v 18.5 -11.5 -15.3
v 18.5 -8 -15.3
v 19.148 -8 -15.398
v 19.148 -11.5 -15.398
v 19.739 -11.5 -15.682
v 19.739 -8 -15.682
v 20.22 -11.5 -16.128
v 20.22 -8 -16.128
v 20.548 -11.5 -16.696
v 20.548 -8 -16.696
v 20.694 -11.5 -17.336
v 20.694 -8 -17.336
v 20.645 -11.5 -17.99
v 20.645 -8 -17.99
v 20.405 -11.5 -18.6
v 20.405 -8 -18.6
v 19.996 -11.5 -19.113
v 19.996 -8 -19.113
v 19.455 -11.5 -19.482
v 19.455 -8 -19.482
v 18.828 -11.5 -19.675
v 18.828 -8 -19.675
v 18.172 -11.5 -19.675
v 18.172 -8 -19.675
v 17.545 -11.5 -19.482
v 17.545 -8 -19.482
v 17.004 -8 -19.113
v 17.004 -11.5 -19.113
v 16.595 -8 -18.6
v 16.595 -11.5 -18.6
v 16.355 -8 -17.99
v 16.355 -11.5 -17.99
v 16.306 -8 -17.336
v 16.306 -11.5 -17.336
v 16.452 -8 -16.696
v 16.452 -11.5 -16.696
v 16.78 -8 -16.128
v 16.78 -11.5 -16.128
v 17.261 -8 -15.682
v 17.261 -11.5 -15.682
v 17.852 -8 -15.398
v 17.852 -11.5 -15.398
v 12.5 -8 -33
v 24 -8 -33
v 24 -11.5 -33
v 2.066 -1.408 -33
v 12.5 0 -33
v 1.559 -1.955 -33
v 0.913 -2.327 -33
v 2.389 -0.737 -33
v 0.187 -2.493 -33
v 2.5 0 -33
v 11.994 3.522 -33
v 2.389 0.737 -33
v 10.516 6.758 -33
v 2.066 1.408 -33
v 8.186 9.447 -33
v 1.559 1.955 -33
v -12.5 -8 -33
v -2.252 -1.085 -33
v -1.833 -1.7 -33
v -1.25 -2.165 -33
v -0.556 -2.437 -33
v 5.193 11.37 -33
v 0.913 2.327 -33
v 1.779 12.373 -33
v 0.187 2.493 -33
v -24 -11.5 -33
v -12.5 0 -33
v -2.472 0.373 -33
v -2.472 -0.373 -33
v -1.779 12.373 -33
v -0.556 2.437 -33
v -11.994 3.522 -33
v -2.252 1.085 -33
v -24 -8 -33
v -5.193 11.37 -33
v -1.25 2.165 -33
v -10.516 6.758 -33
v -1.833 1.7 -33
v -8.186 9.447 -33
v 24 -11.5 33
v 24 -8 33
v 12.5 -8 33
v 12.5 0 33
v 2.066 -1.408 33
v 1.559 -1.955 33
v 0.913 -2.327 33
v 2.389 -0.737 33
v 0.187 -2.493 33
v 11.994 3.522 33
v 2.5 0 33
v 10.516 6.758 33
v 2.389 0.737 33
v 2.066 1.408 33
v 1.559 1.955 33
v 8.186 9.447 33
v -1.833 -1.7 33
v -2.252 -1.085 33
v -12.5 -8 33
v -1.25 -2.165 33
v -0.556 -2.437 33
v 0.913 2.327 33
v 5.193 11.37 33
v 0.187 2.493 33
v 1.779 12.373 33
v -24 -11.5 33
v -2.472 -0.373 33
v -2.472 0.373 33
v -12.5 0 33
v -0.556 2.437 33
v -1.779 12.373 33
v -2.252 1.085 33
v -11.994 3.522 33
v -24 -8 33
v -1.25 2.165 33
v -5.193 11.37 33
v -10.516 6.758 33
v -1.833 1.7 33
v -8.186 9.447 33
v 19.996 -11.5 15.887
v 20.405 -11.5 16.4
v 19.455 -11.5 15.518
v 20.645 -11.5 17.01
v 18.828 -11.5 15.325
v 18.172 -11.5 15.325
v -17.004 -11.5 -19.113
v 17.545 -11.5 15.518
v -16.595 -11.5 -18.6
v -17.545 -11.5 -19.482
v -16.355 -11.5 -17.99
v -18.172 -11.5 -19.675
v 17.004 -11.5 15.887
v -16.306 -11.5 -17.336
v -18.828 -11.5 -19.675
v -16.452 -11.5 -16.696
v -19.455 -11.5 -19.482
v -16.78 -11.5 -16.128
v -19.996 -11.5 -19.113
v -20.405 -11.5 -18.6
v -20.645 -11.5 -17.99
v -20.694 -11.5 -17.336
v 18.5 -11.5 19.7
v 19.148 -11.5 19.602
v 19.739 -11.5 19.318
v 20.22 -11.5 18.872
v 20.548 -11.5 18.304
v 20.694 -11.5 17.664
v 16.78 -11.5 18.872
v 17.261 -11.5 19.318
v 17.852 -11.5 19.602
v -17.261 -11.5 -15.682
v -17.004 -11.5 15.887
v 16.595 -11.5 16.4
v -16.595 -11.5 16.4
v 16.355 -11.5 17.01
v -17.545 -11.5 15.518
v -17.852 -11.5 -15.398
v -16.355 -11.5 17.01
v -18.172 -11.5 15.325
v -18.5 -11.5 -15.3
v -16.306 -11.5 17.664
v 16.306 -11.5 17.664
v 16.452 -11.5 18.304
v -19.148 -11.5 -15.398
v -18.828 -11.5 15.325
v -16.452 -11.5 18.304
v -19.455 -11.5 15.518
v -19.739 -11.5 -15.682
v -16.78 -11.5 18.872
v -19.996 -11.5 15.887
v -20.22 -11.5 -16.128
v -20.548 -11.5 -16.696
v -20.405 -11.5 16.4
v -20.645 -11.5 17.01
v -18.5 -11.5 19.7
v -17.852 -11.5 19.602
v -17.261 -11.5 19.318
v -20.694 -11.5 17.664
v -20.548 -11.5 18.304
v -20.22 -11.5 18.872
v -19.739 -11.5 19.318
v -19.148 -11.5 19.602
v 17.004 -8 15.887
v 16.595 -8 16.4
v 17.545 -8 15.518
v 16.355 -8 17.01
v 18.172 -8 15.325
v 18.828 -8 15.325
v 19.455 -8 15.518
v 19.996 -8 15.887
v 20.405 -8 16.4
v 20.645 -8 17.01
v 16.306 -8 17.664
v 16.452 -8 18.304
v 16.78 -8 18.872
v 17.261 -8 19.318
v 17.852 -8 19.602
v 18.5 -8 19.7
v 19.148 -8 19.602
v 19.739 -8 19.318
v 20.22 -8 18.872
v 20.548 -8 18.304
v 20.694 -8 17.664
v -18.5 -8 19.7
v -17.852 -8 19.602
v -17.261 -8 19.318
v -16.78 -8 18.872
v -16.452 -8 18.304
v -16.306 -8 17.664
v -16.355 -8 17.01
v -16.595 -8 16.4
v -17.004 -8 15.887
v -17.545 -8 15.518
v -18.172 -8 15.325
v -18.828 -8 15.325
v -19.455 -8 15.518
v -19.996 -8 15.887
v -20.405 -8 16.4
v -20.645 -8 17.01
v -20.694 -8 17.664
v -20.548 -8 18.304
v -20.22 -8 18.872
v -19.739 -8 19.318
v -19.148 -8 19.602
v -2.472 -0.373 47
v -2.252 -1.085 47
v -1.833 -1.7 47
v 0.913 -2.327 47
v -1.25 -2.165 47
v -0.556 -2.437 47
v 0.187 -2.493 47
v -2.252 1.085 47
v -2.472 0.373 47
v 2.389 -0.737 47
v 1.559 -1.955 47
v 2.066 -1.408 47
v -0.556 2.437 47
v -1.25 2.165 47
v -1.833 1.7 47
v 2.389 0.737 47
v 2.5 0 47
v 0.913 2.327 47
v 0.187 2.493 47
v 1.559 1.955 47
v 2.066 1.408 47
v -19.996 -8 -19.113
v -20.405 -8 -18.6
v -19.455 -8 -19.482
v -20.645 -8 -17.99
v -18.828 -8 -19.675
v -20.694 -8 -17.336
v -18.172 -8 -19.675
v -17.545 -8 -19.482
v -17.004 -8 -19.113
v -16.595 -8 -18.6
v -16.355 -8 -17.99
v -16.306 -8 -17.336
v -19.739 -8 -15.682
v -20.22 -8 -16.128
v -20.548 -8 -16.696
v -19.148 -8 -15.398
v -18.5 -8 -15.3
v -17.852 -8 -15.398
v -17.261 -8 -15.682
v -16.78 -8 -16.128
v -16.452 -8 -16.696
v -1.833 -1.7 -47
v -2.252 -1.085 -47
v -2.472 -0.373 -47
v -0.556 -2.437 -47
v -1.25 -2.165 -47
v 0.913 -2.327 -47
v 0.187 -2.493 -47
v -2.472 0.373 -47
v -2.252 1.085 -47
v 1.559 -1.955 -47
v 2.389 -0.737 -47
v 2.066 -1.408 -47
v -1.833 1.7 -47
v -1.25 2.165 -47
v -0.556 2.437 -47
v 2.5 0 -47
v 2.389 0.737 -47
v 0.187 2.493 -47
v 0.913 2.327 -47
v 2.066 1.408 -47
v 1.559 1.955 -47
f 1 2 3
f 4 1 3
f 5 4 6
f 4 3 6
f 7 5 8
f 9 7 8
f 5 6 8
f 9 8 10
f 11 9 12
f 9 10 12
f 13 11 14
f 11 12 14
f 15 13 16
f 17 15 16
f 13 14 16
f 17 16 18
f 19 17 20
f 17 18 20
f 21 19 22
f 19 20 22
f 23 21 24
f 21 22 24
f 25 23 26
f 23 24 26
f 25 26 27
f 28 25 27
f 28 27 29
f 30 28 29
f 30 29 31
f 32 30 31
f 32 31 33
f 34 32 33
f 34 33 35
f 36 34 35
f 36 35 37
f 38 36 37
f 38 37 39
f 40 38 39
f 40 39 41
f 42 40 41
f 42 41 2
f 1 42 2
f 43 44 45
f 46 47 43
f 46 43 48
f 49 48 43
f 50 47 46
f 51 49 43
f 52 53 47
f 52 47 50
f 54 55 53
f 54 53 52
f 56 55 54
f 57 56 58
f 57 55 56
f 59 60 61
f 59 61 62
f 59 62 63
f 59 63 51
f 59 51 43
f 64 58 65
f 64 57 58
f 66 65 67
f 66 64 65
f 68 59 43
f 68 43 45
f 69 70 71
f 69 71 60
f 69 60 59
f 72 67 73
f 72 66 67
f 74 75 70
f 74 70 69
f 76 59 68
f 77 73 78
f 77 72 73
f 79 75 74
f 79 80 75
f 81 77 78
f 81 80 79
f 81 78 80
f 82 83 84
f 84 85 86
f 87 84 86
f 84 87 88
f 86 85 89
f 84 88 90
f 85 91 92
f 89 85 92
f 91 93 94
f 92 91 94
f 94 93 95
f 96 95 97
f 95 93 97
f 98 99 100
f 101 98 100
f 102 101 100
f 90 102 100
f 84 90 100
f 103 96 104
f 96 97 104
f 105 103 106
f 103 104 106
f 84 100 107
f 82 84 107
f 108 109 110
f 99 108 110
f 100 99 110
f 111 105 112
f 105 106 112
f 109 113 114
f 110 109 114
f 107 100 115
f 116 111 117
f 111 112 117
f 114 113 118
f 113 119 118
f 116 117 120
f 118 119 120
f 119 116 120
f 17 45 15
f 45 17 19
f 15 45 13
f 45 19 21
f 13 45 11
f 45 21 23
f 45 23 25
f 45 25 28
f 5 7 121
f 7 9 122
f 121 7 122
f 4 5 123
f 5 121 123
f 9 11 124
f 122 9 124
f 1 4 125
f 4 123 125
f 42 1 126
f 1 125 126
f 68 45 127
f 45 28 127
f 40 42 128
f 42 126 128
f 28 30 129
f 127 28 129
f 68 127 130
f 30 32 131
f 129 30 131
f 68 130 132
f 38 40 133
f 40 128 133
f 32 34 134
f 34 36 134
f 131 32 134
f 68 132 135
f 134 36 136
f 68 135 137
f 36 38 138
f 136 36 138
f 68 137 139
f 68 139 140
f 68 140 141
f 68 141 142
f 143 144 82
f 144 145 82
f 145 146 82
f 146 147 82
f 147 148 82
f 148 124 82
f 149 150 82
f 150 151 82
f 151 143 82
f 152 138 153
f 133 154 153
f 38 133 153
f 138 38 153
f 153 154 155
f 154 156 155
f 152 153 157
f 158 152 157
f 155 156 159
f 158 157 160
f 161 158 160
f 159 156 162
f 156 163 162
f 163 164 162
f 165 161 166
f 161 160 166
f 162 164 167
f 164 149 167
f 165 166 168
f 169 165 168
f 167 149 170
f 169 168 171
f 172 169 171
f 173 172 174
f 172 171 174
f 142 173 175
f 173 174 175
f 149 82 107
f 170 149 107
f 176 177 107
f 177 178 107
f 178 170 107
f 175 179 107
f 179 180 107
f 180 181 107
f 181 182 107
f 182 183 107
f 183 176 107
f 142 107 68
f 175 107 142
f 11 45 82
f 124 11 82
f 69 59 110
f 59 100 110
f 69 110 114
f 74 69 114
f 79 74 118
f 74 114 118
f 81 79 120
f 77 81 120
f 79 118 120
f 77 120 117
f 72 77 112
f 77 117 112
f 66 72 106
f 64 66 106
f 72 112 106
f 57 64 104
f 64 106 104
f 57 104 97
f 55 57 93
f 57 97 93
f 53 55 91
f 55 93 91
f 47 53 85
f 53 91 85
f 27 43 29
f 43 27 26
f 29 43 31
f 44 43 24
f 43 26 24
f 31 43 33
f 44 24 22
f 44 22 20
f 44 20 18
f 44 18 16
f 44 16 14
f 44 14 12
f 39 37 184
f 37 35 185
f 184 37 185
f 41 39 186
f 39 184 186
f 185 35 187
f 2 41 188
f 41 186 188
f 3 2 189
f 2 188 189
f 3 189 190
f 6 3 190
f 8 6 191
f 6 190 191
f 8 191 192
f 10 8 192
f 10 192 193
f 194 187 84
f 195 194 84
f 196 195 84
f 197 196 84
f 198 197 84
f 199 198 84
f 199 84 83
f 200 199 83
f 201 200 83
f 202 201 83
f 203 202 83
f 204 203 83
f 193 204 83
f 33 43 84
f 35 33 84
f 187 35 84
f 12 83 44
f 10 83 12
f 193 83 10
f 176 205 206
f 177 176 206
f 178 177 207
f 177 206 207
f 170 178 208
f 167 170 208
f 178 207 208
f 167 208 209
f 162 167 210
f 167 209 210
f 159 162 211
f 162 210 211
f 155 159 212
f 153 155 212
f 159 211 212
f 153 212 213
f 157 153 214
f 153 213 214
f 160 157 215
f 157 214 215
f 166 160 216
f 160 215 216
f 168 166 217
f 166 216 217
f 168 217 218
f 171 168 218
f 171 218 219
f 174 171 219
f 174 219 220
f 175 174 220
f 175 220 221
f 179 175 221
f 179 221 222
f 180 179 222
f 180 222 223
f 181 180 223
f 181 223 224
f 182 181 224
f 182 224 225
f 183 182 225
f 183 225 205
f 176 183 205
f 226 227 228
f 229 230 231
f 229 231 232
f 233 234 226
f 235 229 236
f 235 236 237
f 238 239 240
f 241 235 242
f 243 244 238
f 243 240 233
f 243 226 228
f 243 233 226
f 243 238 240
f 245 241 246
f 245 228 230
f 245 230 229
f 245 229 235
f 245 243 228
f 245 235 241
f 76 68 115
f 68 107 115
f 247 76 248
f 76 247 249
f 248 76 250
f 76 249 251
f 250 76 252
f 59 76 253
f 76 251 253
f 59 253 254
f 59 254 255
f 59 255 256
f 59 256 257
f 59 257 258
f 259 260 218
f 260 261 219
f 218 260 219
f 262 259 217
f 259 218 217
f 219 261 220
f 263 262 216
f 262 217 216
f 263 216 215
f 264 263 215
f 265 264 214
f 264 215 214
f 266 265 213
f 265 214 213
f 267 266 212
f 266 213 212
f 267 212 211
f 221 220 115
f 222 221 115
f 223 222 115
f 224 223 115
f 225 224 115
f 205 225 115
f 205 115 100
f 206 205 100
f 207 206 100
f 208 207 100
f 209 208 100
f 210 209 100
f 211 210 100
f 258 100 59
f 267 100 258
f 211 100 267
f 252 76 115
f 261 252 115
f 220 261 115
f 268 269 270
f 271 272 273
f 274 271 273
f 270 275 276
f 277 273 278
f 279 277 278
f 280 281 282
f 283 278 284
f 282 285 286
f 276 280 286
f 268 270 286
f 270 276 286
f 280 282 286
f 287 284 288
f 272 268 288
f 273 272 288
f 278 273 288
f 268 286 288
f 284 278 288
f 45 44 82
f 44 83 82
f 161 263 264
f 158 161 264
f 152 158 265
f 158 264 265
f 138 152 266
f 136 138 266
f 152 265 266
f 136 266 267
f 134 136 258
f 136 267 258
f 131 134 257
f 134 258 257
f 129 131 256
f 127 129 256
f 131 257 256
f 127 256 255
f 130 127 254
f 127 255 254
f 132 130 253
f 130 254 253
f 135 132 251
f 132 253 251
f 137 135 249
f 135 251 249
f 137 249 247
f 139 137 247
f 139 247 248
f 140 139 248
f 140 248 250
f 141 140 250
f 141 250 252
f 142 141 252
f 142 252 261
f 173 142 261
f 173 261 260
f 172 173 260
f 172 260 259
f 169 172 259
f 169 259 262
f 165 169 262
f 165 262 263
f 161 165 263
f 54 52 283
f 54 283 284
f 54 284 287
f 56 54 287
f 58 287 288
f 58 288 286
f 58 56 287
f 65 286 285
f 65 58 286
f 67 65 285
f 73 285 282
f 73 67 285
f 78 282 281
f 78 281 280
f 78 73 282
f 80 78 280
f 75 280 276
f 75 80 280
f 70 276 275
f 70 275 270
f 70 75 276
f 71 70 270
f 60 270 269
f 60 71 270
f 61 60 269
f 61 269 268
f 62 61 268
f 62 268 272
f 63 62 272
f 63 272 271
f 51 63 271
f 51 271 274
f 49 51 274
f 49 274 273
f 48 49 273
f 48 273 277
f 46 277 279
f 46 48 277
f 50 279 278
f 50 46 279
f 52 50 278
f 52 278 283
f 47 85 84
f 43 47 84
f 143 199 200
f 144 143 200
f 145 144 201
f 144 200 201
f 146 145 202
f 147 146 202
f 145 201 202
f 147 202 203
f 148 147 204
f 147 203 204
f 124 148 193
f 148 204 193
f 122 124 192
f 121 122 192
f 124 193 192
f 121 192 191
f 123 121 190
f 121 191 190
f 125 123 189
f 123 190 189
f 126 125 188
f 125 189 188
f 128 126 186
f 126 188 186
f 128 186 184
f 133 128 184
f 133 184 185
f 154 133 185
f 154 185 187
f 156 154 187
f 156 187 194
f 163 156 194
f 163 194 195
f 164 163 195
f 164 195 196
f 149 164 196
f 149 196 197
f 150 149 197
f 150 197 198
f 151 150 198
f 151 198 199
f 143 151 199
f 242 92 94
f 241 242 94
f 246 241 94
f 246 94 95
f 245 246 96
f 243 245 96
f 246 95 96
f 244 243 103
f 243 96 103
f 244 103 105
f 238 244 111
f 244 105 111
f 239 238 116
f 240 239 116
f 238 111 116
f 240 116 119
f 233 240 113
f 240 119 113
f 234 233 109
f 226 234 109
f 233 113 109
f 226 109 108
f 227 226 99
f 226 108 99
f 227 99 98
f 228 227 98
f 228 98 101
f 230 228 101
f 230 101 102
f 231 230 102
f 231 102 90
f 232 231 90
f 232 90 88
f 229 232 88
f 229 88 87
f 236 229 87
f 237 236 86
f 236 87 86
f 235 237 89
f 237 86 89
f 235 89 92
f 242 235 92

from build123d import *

# Parameters (mm, degrees)
BOSS_EXTRUDE1_DEPTH = 33
SKETCH2_R           = 2.2
CUT_EXTRUDE1_DEPTH  = 46.664537663
SKETCH3_R           = 2.5
BOSS_EXTRUDE2_DEPTH = 14


with BuildPart() as part:
    # Sketch1 → Boss-Extrude1 (new, symmetric)
    with BuildSketch(Plane.XY):
        with BuildLine():
            Line((12.5, -8), (24, -8))
            Line((24, -8), (24, -11.5))
            Line((24, -11.5), (-24, -11.5))
            Line((-24, -11.5), (-24, -8))
            Line((-24, -8), (-12.5, -8))
            Line((-12.5, -8), (-12.5, 0))
            ThreePointArc((-12.5, 0), (0, 12.5), (12.5, 0))
            Line((12.5, 0), (12.5, -8))
        make_face()
    extrude(amount=BOSS_EXTRUDE1_DEPTH, both=True)

    # Sketch2 → Cut-Extrude1 (cut, through all)
    with BuildSketch(Plane(origin=(0, -8, 0), x_dir=(1, 0, 0), z_dir=(0, 1, 0))):
        with Locations(Location((-18.5, 17.5, 0), (0, 0, 270))):
            Circle(SKETCH2_R)
        with Locations(Location((-18.5, -17.5, 0), (0, 0, 270))):
            Circle(SKETCH2_R)
        with Locations(Location((18.5, -17.5, 0), (0, 0, 270))):
            Circle(SKETCH2_R)
        with Locations(Location((18.5, 17.5, 0), (0, 0, 270))):
            Circle(SKETCH2_R)
    extrude(amount=-CUT_EXTRUDE1_DEPTH, mode=Mode.SUBTRACT)

    # Sketch3 → Boss-Extrude2 (add)
    with BuildSketch(Plane.XY.offset(33)):
        Circle(SKETCH3_R)
    boss_extrude2 = extrude(amount=BOSS_EXTRUDE2_DEPTH)

    # Mirror5: Boss-Extrude2 across plane
    add(boss_extrude2.mirror(Plane.XY))


solid = part.part
